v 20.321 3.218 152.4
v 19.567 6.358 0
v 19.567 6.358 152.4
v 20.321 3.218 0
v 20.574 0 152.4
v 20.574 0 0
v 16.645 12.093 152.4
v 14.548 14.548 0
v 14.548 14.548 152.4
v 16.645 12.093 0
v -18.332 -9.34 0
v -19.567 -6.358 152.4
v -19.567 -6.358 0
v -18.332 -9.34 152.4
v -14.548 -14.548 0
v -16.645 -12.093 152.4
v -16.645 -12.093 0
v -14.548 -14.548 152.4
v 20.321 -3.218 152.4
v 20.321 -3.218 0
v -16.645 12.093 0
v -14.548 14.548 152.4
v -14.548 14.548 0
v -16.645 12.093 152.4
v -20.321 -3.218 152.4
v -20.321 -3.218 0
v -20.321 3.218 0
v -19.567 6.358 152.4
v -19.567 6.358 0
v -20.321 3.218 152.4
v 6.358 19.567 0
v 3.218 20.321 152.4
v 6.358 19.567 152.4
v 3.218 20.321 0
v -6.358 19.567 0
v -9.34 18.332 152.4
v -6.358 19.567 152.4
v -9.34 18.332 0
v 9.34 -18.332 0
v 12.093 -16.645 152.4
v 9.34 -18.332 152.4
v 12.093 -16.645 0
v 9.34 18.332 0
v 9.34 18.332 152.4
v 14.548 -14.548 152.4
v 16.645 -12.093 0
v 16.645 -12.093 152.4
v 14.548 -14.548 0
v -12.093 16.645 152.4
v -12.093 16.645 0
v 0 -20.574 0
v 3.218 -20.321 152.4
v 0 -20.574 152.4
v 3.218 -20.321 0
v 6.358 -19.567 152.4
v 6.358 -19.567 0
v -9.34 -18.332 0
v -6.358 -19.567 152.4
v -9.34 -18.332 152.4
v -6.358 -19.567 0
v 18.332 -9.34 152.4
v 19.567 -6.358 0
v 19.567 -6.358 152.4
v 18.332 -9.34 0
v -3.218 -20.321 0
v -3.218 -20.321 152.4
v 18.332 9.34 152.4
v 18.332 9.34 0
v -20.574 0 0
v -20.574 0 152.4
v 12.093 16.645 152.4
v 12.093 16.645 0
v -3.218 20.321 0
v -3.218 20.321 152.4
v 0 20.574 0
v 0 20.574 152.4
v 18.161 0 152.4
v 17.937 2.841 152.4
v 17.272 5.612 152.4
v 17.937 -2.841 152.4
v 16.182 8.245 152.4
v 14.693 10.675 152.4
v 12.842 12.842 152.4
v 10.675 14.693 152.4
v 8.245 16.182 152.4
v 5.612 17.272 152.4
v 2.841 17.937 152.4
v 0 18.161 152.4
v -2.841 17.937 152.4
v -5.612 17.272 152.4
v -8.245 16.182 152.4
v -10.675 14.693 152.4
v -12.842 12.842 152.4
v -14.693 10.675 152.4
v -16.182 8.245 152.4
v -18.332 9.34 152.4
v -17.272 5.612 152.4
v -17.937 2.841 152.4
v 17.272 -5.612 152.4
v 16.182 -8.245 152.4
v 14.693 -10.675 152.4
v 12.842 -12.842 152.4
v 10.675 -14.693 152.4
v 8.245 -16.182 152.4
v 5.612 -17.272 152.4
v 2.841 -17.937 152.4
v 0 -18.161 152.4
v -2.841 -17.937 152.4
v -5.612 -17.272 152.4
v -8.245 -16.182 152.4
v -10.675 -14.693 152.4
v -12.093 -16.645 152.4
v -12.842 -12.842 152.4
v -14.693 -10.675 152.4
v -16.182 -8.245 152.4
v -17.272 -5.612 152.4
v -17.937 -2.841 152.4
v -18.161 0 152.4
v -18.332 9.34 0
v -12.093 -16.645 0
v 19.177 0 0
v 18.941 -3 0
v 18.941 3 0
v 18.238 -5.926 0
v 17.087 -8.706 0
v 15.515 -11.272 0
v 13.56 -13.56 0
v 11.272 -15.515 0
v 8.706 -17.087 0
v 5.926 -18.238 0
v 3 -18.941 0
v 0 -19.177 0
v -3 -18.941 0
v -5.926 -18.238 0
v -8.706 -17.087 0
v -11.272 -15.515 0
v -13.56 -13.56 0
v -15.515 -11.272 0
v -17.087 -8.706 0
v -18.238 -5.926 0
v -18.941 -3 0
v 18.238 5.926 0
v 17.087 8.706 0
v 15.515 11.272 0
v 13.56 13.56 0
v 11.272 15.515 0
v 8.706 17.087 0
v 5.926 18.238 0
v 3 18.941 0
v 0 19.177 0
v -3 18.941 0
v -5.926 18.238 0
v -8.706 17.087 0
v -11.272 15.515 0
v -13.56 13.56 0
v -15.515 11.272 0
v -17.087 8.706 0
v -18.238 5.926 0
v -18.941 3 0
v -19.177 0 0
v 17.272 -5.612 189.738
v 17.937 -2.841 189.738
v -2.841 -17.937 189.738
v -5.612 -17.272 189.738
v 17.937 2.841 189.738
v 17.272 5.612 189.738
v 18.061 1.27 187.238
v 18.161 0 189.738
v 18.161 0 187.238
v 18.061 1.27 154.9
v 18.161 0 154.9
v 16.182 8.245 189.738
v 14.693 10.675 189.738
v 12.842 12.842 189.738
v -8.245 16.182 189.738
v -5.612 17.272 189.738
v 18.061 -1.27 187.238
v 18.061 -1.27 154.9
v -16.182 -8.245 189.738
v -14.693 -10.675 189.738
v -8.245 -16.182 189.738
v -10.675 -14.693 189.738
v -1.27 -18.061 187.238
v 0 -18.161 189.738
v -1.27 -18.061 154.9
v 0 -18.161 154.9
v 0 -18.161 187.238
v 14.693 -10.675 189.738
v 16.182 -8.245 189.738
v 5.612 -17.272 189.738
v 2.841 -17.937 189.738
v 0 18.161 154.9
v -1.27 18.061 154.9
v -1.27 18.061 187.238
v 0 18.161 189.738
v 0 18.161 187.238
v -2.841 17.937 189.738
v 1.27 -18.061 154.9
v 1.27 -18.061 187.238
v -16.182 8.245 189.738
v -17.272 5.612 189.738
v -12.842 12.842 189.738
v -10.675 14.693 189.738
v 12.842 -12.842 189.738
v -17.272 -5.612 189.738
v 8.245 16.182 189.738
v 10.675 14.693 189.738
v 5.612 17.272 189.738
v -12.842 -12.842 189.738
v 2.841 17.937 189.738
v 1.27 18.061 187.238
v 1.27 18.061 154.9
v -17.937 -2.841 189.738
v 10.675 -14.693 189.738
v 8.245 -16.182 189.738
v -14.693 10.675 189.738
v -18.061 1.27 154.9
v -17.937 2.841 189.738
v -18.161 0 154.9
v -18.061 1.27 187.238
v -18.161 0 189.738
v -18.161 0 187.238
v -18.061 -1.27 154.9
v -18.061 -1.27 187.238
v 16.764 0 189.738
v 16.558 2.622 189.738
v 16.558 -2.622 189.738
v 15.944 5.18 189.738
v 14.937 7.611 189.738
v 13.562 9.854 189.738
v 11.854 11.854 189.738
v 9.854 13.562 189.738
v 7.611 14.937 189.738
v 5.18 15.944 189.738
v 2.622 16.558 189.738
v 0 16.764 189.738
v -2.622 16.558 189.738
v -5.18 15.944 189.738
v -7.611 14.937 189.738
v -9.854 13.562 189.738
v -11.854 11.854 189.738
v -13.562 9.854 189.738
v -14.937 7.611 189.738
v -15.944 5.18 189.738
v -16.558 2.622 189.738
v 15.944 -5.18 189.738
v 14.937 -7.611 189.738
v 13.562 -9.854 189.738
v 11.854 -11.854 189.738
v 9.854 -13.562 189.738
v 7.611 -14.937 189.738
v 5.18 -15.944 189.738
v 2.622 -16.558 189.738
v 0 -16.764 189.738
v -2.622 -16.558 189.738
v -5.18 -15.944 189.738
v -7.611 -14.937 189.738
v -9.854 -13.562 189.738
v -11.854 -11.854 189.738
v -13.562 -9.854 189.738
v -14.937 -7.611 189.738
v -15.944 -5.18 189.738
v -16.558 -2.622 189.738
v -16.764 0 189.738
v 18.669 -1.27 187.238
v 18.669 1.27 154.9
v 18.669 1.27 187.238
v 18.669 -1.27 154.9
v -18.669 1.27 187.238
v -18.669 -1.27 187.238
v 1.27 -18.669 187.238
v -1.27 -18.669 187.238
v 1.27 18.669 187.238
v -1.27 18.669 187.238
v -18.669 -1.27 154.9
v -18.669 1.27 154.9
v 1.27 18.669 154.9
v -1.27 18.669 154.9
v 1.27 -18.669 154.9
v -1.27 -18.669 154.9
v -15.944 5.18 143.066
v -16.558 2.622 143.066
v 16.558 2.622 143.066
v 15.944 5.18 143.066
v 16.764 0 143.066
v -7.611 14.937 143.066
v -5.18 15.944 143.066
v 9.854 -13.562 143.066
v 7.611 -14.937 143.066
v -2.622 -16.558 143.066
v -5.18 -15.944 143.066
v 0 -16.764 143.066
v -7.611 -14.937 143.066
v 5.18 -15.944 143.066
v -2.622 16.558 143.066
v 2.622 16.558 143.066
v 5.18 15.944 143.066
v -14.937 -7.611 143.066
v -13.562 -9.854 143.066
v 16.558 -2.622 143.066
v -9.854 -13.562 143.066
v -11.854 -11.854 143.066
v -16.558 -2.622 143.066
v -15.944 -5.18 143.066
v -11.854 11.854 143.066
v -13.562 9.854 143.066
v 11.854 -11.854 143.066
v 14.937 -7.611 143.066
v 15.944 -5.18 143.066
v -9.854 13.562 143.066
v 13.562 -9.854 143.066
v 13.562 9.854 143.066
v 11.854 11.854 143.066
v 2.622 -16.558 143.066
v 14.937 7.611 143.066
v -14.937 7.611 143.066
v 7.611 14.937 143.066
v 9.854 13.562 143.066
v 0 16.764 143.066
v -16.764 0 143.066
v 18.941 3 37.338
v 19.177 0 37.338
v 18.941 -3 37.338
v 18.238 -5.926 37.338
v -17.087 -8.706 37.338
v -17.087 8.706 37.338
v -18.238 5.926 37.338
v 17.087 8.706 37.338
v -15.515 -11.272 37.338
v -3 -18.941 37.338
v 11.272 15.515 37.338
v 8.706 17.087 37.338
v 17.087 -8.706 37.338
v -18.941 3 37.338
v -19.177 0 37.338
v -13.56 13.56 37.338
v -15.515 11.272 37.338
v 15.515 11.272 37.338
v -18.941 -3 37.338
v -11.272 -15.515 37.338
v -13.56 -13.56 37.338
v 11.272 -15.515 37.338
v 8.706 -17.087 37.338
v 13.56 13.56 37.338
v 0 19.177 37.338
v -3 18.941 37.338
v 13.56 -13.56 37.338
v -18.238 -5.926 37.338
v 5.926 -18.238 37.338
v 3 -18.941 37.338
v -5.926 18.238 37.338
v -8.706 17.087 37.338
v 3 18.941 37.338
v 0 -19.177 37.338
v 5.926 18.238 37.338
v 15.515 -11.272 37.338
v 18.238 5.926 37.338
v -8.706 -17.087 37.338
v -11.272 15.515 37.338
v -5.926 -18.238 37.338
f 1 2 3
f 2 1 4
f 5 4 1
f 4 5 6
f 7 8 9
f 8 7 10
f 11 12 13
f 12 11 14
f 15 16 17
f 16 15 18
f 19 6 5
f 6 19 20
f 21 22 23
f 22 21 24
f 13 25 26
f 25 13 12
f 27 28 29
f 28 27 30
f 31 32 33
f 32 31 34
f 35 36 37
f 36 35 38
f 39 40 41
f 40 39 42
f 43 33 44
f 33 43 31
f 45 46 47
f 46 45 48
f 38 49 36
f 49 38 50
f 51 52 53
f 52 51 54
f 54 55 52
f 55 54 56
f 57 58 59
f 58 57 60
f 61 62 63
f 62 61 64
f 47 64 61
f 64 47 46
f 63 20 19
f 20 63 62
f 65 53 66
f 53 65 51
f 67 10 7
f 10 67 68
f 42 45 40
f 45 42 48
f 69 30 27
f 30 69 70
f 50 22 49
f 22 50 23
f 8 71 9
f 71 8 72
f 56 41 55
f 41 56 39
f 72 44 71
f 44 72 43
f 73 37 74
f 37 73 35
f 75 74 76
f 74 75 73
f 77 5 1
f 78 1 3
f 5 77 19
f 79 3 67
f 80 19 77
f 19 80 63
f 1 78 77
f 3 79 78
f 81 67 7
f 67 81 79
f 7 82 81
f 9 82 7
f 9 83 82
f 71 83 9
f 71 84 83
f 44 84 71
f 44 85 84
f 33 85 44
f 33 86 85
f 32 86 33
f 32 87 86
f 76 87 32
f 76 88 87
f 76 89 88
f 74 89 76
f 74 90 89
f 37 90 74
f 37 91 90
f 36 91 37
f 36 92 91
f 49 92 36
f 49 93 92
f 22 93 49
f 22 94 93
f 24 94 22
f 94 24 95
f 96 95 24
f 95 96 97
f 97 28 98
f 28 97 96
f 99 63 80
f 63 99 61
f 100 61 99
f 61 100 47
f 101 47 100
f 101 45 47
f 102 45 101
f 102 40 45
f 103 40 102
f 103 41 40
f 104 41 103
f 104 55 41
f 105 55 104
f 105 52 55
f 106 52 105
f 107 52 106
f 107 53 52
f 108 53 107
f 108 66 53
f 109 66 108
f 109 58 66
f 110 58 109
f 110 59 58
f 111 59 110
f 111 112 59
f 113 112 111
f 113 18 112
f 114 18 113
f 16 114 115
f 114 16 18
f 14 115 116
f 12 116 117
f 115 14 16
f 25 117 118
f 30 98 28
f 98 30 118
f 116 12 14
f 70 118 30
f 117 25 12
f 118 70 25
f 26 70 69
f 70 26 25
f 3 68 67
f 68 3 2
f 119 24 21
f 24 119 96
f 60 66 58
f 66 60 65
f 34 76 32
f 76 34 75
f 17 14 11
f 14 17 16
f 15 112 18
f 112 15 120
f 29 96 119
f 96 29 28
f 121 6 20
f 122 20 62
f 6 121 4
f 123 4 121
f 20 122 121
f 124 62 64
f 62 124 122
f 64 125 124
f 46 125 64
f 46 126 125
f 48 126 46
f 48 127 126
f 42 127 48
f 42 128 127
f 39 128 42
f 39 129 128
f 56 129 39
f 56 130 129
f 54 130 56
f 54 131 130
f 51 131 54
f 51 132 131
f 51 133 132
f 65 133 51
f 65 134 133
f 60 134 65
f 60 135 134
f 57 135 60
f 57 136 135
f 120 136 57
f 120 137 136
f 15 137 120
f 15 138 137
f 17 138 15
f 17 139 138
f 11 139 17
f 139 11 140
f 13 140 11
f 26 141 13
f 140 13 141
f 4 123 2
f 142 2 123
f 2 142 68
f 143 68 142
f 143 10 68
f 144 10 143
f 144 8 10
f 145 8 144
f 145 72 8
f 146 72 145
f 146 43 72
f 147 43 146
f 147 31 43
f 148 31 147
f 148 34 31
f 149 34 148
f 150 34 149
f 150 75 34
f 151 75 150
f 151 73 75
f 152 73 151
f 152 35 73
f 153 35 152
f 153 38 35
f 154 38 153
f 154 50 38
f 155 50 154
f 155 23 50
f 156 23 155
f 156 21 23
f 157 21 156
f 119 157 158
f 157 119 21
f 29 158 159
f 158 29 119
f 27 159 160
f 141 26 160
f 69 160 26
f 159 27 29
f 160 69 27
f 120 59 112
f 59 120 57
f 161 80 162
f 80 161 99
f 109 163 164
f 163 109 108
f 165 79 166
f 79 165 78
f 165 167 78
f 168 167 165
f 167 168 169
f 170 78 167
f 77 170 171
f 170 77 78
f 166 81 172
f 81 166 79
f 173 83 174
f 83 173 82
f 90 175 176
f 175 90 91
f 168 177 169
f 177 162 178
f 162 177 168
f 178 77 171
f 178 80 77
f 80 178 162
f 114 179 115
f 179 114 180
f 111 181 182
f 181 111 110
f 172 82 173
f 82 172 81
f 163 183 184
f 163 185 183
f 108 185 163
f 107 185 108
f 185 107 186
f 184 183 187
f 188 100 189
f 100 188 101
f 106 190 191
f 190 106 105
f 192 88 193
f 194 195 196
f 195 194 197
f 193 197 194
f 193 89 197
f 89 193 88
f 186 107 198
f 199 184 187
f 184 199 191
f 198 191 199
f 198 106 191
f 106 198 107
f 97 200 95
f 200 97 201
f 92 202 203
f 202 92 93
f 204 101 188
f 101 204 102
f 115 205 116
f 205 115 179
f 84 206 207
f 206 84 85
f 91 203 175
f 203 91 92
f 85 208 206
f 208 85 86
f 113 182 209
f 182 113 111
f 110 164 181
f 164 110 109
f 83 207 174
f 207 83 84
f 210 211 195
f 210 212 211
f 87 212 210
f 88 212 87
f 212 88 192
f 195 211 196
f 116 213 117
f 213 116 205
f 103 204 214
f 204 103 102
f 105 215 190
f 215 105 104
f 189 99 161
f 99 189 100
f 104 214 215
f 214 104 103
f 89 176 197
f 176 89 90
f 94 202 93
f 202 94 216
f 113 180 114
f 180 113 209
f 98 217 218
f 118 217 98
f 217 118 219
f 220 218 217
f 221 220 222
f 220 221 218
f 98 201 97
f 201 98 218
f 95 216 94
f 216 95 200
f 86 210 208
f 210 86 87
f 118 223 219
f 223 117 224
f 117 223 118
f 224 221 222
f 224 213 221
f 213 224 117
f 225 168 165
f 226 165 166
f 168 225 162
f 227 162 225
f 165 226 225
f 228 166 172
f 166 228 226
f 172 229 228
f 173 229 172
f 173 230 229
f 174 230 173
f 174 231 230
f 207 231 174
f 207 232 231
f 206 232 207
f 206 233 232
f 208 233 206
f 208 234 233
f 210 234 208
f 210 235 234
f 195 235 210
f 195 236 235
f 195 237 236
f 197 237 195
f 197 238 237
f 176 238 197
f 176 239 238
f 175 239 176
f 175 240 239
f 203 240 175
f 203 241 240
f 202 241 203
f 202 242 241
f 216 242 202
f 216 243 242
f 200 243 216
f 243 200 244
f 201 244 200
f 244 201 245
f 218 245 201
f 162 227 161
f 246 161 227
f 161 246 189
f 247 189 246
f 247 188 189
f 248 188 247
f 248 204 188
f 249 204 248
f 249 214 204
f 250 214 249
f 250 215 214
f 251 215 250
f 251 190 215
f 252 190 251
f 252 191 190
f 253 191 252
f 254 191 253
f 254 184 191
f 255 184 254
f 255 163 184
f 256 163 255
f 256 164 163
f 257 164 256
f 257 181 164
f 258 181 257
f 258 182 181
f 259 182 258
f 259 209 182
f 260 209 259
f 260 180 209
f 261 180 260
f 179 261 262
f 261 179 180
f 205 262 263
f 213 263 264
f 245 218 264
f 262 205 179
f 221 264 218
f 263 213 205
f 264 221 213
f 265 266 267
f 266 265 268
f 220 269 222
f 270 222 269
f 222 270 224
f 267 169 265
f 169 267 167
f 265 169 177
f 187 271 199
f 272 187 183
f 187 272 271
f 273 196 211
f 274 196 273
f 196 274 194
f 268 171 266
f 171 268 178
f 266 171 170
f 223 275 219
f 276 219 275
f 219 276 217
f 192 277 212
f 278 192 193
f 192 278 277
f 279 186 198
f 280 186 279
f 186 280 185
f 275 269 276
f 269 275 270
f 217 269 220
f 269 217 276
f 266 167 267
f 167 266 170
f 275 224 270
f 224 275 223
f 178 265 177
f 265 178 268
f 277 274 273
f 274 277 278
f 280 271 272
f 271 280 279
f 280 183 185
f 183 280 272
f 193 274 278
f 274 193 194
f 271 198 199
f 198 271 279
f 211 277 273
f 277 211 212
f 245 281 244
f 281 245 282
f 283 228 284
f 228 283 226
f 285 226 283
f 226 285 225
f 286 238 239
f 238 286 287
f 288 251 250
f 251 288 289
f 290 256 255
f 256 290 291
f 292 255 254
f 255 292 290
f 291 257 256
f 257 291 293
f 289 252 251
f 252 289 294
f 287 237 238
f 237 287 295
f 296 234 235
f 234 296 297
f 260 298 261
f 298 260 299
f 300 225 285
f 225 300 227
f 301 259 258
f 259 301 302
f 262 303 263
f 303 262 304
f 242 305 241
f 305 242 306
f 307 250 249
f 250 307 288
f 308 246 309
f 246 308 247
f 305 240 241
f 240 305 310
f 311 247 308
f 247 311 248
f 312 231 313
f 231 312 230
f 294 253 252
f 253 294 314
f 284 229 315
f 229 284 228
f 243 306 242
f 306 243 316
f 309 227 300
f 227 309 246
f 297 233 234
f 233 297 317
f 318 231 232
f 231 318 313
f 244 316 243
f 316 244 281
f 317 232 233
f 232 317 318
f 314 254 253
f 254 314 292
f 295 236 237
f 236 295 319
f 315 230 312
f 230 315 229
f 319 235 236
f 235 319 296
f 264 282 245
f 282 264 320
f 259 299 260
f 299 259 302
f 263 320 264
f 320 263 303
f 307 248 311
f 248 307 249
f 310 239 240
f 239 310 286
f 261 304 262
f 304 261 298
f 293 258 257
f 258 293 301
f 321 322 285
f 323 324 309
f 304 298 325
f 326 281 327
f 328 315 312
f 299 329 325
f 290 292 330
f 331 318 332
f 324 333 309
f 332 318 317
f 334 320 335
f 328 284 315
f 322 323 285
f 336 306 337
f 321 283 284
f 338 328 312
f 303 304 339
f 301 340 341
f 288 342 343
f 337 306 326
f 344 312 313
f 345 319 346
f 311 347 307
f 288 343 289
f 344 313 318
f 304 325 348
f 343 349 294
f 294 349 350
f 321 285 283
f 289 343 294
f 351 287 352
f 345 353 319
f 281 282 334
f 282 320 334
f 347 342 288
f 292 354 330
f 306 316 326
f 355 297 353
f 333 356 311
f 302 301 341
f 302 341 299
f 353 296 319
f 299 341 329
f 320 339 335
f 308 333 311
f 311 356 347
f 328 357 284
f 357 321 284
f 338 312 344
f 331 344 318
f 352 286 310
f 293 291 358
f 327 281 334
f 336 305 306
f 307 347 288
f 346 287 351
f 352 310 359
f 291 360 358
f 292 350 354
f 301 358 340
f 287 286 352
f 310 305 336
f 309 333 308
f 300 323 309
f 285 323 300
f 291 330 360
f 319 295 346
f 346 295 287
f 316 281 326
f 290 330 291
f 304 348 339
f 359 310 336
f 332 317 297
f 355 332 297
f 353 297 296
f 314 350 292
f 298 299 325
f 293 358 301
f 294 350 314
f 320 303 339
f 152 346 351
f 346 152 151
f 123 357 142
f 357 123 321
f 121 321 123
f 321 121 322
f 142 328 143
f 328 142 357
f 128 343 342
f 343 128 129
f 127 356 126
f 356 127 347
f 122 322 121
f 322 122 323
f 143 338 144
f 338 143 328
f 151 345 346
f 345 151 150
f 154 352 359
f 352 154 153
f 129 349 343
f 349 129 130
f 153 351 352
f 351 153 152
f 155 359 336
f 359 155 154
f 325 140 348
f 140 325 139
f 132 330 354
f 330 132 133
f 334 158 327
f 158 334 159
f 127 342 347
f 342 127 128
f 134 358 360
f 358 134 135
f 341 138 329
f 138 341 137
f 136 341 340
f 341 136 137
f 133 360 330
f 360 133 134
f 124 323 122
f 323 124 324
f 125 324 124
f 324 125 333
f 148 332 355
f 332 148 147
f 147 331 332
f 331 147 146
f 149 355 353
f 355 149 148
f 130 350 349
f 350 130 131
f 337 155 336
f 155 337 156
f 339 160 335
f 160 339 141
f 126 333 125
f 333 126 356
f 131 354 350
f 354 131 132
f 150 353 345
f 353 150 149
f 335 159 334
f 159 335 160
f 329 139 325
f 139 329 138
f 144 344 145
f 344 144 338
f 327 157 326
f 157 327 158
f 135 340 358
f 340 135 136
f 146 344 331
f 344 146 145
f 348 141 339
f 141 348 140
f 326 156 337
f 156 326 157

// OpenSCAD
height              = 25.4 * 6;
couplerheight       = 25.4 * 1.47;
couplerod           = 25.4 * 1.43;

frictionstripdepth  = 25.4 * 0.04;
frictionstripwidth  = 25.4 * 0.1;

od                  = 25.4 * 1.62;
//od                = 25.4 * 1.75;
//od                = 25.4 * 2;
id                  = 25.4 * 1.51;

fn = 40;

color([0.5,0.5,0.5])
difference() {
        union(){
 
                // Main body
                cylinder($fn = fn, height, r1 = od/2, r2 = od/2);
            
                // Coupler
                translate([0,0,height])
                cylinder($fn = fn, couplerheight, r1 = couplerod/2, r2 = couplerod/2);
                
                // N/S friction strips
                translate([0,0,height+(couplerheight/2)])
                cube(size=[couplerod+frictionstripdepth,frictionstripwidth,couplerheight-5], center = true);
            
                // E/W friction strips
                rotate(90)
                translate([0,0,height+(couplerheight/2)])
                cube(size=[couplerod+frictionstripdepth,frictionstripwidth,couplerheight-5], center = true);
        }     
        union(){
                // Main bore
                cylinder($fn = fn, height+couplerheight, r1 = (couplerod/2)-(od-id)/2, r2 = (couplerod/2)-(od-id)/2);
            
                // internal taper           
                translate([0,0,couplerheight])
                cylinder($fn = fn, height-couplerheight-(couplerheight*0.25), r1 = (id/2), r2 = (couplerod/2)-(od-id)/2);
            
                //female socket
                cylinder($fn = fn, couplerheight, r1 = (id/2), r2 = (id/2));           
        }
}
